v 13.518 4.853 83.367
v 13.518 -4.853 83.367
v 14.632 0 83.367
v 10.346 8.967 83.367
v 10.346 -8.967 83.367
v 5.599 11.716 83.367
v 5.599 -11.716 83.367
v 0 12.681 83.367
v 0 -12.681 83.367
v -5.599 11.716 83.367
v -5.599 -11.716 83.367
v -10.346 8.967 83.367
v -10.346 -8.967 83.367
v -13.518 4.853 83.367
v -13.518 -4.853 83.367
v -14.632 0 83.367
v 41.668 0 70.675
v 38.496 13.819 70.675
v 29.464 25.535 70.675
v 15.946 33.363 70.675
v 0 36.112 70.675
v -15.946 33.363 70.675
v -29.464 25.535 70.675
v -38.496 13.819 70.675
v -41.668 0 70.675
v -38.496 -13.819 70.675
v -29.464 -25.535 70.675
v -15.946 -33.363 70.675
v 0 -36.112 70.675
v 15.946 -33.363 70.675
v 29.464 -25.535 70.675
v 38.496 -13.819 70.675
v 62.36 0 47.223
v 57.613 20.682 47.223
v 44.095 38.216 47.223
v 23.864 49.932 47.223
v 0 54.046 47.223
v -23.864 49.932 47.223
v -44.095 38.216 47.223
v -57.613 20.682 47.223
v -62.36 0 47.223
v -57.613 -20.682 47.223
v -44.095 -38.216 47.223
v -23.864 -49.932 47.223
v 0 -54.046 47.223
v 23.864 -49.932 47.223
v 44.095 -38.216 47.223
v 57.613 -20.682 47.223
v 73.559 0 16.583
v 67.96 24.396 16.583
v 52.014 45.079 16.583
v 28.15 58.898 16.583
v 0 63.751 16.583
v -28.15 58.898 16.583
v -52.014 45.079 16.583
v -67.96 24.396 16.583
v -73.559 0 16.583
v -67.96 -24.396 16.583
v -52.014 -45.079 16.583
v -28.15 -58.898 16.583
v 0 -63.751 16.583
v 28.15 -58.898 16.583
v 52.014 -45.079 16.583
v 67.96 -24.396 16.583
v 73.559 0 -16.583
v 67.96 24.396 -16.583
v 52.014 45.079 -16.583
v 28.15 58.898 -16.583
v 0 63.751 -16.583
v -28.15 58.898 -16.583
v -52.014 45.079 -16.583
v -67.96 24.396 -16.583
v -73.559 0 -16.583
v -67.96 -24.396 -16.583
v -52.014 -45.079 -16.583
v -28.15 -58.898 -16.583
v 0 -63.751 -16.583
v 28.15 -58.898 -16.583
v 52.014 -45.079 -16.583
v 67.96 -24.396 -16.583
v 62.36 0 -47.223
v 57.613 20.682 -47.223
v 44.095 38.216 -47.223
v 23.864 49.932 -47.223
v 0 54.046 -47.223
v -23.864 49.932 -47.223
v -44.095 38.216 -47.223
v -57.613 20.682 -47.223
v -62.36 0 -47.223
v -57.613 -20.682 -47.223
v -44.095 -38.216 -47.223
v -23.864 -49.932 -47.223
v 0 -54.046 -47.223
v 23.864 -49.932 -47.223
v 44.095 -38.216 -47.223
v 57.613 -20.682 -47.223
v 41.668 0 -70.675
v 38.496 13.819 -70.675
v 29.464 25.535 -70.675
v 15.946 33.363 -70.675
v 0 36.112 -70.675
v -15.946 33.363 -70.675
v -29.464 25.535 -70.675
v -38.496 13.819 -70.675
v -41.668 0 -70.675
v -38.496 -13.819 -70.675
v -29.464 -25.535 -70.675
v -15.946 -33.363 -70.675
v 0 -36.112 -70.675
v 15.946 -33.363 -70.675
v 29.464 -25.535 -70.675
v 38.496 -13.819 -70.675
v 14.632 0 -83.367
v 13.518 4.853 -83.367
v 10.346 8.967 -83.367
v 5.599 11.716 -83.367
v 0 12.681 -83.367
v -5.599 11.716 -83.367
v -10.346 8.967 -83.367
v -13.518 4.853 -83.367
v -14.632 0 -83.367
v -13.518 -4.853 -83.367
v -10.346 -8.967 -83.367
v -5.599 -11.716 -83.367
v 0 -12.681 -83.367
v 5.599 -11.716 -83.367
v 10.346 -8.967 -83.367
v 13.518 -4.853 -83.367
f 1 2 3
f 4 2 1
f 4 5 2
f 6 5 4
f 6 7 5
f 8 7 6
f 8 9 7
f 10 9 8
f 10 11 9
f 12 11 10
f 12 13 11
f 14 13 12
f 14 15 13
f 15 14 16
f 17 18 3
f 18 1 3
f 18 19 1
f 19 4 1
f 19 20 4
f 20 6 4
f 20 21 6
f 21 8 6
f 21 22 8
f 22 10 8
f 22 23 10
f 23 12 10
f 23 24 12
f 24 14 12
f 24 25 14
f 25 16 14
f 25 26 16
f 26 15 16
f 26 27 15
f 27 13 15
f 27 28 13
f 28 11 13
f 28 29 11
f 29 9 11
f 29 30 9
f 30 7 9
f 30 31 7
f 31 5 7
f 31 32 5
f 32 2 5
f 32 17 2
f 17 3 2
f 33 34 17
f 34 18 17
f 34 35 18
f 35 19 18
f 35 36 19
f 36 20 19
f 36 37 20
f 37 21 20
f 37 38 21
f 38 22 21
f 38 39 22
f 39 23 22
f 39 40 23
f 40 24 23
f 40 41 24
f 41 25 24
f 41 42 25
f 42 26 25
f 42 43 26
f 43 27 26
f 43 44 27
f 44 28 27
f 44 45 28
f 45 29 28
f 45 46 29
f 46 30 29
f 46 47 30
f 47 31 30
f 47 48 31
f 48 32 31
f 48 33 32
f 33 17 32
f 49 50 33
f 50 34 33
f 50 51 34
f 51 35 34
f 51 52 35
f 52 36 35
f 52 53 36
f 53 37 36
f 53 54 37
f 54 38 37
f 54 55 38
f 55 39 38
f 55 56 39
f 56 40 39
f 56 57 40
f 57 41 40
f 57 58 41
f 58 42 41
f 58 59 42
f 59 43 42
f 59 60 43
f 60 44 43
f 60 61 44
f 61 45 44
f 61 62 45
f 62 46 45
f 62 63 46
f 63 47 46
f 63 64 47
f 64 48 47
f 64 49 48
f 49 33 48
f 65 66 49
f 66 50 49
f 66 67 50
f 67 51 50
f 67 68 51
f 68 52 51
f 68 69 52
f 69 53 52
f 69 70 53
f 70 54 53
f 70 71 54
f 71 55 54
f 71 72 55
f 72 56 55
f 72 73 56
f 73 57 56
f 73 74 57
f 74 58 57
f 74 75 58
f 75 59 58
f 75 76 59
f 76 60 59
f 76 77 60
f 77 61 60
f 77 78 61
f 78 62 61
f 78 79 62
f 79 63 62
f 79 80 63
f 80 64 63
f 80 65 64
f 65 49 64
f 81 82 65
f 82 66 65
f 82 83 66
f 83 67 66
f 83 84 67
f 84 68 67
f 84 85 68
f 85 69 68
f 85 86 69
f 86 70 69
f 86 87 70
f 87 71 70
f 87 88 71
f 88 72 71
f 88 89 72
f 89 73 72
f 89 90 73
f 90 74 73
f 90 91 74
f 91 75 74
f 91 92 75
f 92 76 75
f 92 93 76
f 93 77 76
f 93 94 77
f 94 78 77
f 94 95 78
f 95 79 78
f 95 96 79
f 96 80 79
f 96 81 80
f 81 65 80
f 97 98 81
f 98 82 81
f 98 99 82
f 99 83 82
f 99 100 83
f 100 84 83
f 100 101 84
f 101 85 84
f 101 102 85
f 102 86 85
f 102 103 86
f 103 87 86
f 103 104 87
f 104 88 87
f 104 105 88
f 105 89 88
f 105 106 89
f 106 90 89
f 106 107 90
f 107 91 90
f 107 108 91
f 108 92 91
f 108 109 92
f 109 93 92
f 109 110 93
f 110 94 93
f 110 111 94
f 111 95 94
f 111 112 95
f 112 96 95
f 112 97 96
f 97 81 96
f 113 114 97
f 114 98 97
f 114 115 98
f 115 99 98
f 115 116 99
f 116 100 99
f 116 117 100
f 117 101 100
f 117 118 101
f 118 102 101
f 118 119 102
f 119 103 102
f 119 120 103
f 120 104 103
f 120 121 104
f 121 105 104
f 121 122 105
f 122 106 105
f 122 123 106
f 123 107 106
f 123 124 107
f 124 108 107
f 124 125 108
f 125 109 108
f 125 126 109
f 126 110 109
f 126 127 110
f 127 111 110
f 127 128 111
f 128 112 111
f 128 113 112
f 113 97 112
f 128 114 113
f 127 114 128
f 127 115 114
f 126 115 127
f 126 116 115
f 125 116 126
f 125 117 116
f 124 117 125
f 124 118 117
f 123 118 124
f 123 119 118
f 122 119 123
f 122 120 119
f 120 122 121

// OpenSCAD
// Generated by SolidPython 1.0.1 on 2020-07-29 00:46:52


scale(v = [15, 13, 17]) {
	sphere(r = 5);
}
/***********************************************
*********      SolidPython code:      **********
************************************************
 
# import packages: SolidPython
from solid import *
from solid.utils import *
from itertools import chain, combinations, permutations


class Resize:

    def __init__(self, scad_file):
        self.scad_file = scad_file
        #self.scad_file = import_scad(scad_file)
        # cone/cylinder param:
        self.r1 = 0
        self.r2 = 0
        self.h = 0
        # rectangular prism param:
        self.w = 0
        self.l = 0
        # ellipse param:
        self.r = 0

    # import OpenScad code (file name corresponds to shape)


    # classify shape + parameters
    def assign(self, param1, param2, param3):
        if self.scad_file == 'cone.scad':
            self.r1 = param1
            self.r2 = param2
            self.h = param3
        elif self.scad_file == 'cylinder.scad':
            self.r1 = param1
            self.r2 = param2
            self.h = param3
        elif self.scad_file == 'rectangularPrism.scad':
            self.h = param1
            self.l = param2
            self.w = param3
        else:
            self.r = param1
            self.h = param2

    # resize parameters
    def iterate(self):
        x = range(3, 20, 2)
        i = 1
        if self.scad_file == 'cone.scad':
            tempList = list(permutations(x, 2))
            for temp in tempList:
                param1 = temp[0]
                param2 = temp[1]
                filepath = 'produced_scad_files/' + 'cone' + str(param1) + '_' + str(param2) + '_' + '.scad'
                scad_render_to_file(cylinder(h=param1, r1=param2, r2=0), filepath)

        elif self.scad_file == 'cylinder.scad':
            tempList = list(permutations(x, 3))
            for temp in tempList:
                param1 = temp[0]
                param2 = temp[1]
                filepath = 'produced_scad_files/' + 'cylinder' + str(param1) + '_' + str(param2) + '_' + '.scad'
                scad_render_to_file(cylinder(h=param1, r1=param2, r2=param2), filepath)

        elif self.scad_file == 'rectangularPrism.scad':
            tempList = list(permutations(x, 3))
            for temp in tempList:
                param1 = temp[0]
                param2 = temp[1]
                param3 = temp[2]
                filepath = 'produced_scad_files/' + 'rectangularPrism' + str(param1) + '_' + str(param2) + '_' + str(
                    param3) + '.scad'
                scad_render_to_file(cube(size=(param1, param2, param3)), filepath)

        elif self.scad_file == 'ellipse.scad':
            tempList = list(permutations(x, 4))
            for temp in tempList:
                param1 = temp[0]
                param2 = temp[1]
                param3 = temp[2]
                param4 = temp[3]
                filepath = 'produced_scad_files/' + 'ellipse' + str(param1) + '_' + str(param2) + '_' + str(param3) + '_' + str(param4) + '.scad'
                scad_render_to_file(scale([param1, param2, param3])(sphere(r=param4)), filepath)

    def render_to_scadfile(self):
        scad_render_to_file(scad, 'example.scad') 
 
************************************************/
